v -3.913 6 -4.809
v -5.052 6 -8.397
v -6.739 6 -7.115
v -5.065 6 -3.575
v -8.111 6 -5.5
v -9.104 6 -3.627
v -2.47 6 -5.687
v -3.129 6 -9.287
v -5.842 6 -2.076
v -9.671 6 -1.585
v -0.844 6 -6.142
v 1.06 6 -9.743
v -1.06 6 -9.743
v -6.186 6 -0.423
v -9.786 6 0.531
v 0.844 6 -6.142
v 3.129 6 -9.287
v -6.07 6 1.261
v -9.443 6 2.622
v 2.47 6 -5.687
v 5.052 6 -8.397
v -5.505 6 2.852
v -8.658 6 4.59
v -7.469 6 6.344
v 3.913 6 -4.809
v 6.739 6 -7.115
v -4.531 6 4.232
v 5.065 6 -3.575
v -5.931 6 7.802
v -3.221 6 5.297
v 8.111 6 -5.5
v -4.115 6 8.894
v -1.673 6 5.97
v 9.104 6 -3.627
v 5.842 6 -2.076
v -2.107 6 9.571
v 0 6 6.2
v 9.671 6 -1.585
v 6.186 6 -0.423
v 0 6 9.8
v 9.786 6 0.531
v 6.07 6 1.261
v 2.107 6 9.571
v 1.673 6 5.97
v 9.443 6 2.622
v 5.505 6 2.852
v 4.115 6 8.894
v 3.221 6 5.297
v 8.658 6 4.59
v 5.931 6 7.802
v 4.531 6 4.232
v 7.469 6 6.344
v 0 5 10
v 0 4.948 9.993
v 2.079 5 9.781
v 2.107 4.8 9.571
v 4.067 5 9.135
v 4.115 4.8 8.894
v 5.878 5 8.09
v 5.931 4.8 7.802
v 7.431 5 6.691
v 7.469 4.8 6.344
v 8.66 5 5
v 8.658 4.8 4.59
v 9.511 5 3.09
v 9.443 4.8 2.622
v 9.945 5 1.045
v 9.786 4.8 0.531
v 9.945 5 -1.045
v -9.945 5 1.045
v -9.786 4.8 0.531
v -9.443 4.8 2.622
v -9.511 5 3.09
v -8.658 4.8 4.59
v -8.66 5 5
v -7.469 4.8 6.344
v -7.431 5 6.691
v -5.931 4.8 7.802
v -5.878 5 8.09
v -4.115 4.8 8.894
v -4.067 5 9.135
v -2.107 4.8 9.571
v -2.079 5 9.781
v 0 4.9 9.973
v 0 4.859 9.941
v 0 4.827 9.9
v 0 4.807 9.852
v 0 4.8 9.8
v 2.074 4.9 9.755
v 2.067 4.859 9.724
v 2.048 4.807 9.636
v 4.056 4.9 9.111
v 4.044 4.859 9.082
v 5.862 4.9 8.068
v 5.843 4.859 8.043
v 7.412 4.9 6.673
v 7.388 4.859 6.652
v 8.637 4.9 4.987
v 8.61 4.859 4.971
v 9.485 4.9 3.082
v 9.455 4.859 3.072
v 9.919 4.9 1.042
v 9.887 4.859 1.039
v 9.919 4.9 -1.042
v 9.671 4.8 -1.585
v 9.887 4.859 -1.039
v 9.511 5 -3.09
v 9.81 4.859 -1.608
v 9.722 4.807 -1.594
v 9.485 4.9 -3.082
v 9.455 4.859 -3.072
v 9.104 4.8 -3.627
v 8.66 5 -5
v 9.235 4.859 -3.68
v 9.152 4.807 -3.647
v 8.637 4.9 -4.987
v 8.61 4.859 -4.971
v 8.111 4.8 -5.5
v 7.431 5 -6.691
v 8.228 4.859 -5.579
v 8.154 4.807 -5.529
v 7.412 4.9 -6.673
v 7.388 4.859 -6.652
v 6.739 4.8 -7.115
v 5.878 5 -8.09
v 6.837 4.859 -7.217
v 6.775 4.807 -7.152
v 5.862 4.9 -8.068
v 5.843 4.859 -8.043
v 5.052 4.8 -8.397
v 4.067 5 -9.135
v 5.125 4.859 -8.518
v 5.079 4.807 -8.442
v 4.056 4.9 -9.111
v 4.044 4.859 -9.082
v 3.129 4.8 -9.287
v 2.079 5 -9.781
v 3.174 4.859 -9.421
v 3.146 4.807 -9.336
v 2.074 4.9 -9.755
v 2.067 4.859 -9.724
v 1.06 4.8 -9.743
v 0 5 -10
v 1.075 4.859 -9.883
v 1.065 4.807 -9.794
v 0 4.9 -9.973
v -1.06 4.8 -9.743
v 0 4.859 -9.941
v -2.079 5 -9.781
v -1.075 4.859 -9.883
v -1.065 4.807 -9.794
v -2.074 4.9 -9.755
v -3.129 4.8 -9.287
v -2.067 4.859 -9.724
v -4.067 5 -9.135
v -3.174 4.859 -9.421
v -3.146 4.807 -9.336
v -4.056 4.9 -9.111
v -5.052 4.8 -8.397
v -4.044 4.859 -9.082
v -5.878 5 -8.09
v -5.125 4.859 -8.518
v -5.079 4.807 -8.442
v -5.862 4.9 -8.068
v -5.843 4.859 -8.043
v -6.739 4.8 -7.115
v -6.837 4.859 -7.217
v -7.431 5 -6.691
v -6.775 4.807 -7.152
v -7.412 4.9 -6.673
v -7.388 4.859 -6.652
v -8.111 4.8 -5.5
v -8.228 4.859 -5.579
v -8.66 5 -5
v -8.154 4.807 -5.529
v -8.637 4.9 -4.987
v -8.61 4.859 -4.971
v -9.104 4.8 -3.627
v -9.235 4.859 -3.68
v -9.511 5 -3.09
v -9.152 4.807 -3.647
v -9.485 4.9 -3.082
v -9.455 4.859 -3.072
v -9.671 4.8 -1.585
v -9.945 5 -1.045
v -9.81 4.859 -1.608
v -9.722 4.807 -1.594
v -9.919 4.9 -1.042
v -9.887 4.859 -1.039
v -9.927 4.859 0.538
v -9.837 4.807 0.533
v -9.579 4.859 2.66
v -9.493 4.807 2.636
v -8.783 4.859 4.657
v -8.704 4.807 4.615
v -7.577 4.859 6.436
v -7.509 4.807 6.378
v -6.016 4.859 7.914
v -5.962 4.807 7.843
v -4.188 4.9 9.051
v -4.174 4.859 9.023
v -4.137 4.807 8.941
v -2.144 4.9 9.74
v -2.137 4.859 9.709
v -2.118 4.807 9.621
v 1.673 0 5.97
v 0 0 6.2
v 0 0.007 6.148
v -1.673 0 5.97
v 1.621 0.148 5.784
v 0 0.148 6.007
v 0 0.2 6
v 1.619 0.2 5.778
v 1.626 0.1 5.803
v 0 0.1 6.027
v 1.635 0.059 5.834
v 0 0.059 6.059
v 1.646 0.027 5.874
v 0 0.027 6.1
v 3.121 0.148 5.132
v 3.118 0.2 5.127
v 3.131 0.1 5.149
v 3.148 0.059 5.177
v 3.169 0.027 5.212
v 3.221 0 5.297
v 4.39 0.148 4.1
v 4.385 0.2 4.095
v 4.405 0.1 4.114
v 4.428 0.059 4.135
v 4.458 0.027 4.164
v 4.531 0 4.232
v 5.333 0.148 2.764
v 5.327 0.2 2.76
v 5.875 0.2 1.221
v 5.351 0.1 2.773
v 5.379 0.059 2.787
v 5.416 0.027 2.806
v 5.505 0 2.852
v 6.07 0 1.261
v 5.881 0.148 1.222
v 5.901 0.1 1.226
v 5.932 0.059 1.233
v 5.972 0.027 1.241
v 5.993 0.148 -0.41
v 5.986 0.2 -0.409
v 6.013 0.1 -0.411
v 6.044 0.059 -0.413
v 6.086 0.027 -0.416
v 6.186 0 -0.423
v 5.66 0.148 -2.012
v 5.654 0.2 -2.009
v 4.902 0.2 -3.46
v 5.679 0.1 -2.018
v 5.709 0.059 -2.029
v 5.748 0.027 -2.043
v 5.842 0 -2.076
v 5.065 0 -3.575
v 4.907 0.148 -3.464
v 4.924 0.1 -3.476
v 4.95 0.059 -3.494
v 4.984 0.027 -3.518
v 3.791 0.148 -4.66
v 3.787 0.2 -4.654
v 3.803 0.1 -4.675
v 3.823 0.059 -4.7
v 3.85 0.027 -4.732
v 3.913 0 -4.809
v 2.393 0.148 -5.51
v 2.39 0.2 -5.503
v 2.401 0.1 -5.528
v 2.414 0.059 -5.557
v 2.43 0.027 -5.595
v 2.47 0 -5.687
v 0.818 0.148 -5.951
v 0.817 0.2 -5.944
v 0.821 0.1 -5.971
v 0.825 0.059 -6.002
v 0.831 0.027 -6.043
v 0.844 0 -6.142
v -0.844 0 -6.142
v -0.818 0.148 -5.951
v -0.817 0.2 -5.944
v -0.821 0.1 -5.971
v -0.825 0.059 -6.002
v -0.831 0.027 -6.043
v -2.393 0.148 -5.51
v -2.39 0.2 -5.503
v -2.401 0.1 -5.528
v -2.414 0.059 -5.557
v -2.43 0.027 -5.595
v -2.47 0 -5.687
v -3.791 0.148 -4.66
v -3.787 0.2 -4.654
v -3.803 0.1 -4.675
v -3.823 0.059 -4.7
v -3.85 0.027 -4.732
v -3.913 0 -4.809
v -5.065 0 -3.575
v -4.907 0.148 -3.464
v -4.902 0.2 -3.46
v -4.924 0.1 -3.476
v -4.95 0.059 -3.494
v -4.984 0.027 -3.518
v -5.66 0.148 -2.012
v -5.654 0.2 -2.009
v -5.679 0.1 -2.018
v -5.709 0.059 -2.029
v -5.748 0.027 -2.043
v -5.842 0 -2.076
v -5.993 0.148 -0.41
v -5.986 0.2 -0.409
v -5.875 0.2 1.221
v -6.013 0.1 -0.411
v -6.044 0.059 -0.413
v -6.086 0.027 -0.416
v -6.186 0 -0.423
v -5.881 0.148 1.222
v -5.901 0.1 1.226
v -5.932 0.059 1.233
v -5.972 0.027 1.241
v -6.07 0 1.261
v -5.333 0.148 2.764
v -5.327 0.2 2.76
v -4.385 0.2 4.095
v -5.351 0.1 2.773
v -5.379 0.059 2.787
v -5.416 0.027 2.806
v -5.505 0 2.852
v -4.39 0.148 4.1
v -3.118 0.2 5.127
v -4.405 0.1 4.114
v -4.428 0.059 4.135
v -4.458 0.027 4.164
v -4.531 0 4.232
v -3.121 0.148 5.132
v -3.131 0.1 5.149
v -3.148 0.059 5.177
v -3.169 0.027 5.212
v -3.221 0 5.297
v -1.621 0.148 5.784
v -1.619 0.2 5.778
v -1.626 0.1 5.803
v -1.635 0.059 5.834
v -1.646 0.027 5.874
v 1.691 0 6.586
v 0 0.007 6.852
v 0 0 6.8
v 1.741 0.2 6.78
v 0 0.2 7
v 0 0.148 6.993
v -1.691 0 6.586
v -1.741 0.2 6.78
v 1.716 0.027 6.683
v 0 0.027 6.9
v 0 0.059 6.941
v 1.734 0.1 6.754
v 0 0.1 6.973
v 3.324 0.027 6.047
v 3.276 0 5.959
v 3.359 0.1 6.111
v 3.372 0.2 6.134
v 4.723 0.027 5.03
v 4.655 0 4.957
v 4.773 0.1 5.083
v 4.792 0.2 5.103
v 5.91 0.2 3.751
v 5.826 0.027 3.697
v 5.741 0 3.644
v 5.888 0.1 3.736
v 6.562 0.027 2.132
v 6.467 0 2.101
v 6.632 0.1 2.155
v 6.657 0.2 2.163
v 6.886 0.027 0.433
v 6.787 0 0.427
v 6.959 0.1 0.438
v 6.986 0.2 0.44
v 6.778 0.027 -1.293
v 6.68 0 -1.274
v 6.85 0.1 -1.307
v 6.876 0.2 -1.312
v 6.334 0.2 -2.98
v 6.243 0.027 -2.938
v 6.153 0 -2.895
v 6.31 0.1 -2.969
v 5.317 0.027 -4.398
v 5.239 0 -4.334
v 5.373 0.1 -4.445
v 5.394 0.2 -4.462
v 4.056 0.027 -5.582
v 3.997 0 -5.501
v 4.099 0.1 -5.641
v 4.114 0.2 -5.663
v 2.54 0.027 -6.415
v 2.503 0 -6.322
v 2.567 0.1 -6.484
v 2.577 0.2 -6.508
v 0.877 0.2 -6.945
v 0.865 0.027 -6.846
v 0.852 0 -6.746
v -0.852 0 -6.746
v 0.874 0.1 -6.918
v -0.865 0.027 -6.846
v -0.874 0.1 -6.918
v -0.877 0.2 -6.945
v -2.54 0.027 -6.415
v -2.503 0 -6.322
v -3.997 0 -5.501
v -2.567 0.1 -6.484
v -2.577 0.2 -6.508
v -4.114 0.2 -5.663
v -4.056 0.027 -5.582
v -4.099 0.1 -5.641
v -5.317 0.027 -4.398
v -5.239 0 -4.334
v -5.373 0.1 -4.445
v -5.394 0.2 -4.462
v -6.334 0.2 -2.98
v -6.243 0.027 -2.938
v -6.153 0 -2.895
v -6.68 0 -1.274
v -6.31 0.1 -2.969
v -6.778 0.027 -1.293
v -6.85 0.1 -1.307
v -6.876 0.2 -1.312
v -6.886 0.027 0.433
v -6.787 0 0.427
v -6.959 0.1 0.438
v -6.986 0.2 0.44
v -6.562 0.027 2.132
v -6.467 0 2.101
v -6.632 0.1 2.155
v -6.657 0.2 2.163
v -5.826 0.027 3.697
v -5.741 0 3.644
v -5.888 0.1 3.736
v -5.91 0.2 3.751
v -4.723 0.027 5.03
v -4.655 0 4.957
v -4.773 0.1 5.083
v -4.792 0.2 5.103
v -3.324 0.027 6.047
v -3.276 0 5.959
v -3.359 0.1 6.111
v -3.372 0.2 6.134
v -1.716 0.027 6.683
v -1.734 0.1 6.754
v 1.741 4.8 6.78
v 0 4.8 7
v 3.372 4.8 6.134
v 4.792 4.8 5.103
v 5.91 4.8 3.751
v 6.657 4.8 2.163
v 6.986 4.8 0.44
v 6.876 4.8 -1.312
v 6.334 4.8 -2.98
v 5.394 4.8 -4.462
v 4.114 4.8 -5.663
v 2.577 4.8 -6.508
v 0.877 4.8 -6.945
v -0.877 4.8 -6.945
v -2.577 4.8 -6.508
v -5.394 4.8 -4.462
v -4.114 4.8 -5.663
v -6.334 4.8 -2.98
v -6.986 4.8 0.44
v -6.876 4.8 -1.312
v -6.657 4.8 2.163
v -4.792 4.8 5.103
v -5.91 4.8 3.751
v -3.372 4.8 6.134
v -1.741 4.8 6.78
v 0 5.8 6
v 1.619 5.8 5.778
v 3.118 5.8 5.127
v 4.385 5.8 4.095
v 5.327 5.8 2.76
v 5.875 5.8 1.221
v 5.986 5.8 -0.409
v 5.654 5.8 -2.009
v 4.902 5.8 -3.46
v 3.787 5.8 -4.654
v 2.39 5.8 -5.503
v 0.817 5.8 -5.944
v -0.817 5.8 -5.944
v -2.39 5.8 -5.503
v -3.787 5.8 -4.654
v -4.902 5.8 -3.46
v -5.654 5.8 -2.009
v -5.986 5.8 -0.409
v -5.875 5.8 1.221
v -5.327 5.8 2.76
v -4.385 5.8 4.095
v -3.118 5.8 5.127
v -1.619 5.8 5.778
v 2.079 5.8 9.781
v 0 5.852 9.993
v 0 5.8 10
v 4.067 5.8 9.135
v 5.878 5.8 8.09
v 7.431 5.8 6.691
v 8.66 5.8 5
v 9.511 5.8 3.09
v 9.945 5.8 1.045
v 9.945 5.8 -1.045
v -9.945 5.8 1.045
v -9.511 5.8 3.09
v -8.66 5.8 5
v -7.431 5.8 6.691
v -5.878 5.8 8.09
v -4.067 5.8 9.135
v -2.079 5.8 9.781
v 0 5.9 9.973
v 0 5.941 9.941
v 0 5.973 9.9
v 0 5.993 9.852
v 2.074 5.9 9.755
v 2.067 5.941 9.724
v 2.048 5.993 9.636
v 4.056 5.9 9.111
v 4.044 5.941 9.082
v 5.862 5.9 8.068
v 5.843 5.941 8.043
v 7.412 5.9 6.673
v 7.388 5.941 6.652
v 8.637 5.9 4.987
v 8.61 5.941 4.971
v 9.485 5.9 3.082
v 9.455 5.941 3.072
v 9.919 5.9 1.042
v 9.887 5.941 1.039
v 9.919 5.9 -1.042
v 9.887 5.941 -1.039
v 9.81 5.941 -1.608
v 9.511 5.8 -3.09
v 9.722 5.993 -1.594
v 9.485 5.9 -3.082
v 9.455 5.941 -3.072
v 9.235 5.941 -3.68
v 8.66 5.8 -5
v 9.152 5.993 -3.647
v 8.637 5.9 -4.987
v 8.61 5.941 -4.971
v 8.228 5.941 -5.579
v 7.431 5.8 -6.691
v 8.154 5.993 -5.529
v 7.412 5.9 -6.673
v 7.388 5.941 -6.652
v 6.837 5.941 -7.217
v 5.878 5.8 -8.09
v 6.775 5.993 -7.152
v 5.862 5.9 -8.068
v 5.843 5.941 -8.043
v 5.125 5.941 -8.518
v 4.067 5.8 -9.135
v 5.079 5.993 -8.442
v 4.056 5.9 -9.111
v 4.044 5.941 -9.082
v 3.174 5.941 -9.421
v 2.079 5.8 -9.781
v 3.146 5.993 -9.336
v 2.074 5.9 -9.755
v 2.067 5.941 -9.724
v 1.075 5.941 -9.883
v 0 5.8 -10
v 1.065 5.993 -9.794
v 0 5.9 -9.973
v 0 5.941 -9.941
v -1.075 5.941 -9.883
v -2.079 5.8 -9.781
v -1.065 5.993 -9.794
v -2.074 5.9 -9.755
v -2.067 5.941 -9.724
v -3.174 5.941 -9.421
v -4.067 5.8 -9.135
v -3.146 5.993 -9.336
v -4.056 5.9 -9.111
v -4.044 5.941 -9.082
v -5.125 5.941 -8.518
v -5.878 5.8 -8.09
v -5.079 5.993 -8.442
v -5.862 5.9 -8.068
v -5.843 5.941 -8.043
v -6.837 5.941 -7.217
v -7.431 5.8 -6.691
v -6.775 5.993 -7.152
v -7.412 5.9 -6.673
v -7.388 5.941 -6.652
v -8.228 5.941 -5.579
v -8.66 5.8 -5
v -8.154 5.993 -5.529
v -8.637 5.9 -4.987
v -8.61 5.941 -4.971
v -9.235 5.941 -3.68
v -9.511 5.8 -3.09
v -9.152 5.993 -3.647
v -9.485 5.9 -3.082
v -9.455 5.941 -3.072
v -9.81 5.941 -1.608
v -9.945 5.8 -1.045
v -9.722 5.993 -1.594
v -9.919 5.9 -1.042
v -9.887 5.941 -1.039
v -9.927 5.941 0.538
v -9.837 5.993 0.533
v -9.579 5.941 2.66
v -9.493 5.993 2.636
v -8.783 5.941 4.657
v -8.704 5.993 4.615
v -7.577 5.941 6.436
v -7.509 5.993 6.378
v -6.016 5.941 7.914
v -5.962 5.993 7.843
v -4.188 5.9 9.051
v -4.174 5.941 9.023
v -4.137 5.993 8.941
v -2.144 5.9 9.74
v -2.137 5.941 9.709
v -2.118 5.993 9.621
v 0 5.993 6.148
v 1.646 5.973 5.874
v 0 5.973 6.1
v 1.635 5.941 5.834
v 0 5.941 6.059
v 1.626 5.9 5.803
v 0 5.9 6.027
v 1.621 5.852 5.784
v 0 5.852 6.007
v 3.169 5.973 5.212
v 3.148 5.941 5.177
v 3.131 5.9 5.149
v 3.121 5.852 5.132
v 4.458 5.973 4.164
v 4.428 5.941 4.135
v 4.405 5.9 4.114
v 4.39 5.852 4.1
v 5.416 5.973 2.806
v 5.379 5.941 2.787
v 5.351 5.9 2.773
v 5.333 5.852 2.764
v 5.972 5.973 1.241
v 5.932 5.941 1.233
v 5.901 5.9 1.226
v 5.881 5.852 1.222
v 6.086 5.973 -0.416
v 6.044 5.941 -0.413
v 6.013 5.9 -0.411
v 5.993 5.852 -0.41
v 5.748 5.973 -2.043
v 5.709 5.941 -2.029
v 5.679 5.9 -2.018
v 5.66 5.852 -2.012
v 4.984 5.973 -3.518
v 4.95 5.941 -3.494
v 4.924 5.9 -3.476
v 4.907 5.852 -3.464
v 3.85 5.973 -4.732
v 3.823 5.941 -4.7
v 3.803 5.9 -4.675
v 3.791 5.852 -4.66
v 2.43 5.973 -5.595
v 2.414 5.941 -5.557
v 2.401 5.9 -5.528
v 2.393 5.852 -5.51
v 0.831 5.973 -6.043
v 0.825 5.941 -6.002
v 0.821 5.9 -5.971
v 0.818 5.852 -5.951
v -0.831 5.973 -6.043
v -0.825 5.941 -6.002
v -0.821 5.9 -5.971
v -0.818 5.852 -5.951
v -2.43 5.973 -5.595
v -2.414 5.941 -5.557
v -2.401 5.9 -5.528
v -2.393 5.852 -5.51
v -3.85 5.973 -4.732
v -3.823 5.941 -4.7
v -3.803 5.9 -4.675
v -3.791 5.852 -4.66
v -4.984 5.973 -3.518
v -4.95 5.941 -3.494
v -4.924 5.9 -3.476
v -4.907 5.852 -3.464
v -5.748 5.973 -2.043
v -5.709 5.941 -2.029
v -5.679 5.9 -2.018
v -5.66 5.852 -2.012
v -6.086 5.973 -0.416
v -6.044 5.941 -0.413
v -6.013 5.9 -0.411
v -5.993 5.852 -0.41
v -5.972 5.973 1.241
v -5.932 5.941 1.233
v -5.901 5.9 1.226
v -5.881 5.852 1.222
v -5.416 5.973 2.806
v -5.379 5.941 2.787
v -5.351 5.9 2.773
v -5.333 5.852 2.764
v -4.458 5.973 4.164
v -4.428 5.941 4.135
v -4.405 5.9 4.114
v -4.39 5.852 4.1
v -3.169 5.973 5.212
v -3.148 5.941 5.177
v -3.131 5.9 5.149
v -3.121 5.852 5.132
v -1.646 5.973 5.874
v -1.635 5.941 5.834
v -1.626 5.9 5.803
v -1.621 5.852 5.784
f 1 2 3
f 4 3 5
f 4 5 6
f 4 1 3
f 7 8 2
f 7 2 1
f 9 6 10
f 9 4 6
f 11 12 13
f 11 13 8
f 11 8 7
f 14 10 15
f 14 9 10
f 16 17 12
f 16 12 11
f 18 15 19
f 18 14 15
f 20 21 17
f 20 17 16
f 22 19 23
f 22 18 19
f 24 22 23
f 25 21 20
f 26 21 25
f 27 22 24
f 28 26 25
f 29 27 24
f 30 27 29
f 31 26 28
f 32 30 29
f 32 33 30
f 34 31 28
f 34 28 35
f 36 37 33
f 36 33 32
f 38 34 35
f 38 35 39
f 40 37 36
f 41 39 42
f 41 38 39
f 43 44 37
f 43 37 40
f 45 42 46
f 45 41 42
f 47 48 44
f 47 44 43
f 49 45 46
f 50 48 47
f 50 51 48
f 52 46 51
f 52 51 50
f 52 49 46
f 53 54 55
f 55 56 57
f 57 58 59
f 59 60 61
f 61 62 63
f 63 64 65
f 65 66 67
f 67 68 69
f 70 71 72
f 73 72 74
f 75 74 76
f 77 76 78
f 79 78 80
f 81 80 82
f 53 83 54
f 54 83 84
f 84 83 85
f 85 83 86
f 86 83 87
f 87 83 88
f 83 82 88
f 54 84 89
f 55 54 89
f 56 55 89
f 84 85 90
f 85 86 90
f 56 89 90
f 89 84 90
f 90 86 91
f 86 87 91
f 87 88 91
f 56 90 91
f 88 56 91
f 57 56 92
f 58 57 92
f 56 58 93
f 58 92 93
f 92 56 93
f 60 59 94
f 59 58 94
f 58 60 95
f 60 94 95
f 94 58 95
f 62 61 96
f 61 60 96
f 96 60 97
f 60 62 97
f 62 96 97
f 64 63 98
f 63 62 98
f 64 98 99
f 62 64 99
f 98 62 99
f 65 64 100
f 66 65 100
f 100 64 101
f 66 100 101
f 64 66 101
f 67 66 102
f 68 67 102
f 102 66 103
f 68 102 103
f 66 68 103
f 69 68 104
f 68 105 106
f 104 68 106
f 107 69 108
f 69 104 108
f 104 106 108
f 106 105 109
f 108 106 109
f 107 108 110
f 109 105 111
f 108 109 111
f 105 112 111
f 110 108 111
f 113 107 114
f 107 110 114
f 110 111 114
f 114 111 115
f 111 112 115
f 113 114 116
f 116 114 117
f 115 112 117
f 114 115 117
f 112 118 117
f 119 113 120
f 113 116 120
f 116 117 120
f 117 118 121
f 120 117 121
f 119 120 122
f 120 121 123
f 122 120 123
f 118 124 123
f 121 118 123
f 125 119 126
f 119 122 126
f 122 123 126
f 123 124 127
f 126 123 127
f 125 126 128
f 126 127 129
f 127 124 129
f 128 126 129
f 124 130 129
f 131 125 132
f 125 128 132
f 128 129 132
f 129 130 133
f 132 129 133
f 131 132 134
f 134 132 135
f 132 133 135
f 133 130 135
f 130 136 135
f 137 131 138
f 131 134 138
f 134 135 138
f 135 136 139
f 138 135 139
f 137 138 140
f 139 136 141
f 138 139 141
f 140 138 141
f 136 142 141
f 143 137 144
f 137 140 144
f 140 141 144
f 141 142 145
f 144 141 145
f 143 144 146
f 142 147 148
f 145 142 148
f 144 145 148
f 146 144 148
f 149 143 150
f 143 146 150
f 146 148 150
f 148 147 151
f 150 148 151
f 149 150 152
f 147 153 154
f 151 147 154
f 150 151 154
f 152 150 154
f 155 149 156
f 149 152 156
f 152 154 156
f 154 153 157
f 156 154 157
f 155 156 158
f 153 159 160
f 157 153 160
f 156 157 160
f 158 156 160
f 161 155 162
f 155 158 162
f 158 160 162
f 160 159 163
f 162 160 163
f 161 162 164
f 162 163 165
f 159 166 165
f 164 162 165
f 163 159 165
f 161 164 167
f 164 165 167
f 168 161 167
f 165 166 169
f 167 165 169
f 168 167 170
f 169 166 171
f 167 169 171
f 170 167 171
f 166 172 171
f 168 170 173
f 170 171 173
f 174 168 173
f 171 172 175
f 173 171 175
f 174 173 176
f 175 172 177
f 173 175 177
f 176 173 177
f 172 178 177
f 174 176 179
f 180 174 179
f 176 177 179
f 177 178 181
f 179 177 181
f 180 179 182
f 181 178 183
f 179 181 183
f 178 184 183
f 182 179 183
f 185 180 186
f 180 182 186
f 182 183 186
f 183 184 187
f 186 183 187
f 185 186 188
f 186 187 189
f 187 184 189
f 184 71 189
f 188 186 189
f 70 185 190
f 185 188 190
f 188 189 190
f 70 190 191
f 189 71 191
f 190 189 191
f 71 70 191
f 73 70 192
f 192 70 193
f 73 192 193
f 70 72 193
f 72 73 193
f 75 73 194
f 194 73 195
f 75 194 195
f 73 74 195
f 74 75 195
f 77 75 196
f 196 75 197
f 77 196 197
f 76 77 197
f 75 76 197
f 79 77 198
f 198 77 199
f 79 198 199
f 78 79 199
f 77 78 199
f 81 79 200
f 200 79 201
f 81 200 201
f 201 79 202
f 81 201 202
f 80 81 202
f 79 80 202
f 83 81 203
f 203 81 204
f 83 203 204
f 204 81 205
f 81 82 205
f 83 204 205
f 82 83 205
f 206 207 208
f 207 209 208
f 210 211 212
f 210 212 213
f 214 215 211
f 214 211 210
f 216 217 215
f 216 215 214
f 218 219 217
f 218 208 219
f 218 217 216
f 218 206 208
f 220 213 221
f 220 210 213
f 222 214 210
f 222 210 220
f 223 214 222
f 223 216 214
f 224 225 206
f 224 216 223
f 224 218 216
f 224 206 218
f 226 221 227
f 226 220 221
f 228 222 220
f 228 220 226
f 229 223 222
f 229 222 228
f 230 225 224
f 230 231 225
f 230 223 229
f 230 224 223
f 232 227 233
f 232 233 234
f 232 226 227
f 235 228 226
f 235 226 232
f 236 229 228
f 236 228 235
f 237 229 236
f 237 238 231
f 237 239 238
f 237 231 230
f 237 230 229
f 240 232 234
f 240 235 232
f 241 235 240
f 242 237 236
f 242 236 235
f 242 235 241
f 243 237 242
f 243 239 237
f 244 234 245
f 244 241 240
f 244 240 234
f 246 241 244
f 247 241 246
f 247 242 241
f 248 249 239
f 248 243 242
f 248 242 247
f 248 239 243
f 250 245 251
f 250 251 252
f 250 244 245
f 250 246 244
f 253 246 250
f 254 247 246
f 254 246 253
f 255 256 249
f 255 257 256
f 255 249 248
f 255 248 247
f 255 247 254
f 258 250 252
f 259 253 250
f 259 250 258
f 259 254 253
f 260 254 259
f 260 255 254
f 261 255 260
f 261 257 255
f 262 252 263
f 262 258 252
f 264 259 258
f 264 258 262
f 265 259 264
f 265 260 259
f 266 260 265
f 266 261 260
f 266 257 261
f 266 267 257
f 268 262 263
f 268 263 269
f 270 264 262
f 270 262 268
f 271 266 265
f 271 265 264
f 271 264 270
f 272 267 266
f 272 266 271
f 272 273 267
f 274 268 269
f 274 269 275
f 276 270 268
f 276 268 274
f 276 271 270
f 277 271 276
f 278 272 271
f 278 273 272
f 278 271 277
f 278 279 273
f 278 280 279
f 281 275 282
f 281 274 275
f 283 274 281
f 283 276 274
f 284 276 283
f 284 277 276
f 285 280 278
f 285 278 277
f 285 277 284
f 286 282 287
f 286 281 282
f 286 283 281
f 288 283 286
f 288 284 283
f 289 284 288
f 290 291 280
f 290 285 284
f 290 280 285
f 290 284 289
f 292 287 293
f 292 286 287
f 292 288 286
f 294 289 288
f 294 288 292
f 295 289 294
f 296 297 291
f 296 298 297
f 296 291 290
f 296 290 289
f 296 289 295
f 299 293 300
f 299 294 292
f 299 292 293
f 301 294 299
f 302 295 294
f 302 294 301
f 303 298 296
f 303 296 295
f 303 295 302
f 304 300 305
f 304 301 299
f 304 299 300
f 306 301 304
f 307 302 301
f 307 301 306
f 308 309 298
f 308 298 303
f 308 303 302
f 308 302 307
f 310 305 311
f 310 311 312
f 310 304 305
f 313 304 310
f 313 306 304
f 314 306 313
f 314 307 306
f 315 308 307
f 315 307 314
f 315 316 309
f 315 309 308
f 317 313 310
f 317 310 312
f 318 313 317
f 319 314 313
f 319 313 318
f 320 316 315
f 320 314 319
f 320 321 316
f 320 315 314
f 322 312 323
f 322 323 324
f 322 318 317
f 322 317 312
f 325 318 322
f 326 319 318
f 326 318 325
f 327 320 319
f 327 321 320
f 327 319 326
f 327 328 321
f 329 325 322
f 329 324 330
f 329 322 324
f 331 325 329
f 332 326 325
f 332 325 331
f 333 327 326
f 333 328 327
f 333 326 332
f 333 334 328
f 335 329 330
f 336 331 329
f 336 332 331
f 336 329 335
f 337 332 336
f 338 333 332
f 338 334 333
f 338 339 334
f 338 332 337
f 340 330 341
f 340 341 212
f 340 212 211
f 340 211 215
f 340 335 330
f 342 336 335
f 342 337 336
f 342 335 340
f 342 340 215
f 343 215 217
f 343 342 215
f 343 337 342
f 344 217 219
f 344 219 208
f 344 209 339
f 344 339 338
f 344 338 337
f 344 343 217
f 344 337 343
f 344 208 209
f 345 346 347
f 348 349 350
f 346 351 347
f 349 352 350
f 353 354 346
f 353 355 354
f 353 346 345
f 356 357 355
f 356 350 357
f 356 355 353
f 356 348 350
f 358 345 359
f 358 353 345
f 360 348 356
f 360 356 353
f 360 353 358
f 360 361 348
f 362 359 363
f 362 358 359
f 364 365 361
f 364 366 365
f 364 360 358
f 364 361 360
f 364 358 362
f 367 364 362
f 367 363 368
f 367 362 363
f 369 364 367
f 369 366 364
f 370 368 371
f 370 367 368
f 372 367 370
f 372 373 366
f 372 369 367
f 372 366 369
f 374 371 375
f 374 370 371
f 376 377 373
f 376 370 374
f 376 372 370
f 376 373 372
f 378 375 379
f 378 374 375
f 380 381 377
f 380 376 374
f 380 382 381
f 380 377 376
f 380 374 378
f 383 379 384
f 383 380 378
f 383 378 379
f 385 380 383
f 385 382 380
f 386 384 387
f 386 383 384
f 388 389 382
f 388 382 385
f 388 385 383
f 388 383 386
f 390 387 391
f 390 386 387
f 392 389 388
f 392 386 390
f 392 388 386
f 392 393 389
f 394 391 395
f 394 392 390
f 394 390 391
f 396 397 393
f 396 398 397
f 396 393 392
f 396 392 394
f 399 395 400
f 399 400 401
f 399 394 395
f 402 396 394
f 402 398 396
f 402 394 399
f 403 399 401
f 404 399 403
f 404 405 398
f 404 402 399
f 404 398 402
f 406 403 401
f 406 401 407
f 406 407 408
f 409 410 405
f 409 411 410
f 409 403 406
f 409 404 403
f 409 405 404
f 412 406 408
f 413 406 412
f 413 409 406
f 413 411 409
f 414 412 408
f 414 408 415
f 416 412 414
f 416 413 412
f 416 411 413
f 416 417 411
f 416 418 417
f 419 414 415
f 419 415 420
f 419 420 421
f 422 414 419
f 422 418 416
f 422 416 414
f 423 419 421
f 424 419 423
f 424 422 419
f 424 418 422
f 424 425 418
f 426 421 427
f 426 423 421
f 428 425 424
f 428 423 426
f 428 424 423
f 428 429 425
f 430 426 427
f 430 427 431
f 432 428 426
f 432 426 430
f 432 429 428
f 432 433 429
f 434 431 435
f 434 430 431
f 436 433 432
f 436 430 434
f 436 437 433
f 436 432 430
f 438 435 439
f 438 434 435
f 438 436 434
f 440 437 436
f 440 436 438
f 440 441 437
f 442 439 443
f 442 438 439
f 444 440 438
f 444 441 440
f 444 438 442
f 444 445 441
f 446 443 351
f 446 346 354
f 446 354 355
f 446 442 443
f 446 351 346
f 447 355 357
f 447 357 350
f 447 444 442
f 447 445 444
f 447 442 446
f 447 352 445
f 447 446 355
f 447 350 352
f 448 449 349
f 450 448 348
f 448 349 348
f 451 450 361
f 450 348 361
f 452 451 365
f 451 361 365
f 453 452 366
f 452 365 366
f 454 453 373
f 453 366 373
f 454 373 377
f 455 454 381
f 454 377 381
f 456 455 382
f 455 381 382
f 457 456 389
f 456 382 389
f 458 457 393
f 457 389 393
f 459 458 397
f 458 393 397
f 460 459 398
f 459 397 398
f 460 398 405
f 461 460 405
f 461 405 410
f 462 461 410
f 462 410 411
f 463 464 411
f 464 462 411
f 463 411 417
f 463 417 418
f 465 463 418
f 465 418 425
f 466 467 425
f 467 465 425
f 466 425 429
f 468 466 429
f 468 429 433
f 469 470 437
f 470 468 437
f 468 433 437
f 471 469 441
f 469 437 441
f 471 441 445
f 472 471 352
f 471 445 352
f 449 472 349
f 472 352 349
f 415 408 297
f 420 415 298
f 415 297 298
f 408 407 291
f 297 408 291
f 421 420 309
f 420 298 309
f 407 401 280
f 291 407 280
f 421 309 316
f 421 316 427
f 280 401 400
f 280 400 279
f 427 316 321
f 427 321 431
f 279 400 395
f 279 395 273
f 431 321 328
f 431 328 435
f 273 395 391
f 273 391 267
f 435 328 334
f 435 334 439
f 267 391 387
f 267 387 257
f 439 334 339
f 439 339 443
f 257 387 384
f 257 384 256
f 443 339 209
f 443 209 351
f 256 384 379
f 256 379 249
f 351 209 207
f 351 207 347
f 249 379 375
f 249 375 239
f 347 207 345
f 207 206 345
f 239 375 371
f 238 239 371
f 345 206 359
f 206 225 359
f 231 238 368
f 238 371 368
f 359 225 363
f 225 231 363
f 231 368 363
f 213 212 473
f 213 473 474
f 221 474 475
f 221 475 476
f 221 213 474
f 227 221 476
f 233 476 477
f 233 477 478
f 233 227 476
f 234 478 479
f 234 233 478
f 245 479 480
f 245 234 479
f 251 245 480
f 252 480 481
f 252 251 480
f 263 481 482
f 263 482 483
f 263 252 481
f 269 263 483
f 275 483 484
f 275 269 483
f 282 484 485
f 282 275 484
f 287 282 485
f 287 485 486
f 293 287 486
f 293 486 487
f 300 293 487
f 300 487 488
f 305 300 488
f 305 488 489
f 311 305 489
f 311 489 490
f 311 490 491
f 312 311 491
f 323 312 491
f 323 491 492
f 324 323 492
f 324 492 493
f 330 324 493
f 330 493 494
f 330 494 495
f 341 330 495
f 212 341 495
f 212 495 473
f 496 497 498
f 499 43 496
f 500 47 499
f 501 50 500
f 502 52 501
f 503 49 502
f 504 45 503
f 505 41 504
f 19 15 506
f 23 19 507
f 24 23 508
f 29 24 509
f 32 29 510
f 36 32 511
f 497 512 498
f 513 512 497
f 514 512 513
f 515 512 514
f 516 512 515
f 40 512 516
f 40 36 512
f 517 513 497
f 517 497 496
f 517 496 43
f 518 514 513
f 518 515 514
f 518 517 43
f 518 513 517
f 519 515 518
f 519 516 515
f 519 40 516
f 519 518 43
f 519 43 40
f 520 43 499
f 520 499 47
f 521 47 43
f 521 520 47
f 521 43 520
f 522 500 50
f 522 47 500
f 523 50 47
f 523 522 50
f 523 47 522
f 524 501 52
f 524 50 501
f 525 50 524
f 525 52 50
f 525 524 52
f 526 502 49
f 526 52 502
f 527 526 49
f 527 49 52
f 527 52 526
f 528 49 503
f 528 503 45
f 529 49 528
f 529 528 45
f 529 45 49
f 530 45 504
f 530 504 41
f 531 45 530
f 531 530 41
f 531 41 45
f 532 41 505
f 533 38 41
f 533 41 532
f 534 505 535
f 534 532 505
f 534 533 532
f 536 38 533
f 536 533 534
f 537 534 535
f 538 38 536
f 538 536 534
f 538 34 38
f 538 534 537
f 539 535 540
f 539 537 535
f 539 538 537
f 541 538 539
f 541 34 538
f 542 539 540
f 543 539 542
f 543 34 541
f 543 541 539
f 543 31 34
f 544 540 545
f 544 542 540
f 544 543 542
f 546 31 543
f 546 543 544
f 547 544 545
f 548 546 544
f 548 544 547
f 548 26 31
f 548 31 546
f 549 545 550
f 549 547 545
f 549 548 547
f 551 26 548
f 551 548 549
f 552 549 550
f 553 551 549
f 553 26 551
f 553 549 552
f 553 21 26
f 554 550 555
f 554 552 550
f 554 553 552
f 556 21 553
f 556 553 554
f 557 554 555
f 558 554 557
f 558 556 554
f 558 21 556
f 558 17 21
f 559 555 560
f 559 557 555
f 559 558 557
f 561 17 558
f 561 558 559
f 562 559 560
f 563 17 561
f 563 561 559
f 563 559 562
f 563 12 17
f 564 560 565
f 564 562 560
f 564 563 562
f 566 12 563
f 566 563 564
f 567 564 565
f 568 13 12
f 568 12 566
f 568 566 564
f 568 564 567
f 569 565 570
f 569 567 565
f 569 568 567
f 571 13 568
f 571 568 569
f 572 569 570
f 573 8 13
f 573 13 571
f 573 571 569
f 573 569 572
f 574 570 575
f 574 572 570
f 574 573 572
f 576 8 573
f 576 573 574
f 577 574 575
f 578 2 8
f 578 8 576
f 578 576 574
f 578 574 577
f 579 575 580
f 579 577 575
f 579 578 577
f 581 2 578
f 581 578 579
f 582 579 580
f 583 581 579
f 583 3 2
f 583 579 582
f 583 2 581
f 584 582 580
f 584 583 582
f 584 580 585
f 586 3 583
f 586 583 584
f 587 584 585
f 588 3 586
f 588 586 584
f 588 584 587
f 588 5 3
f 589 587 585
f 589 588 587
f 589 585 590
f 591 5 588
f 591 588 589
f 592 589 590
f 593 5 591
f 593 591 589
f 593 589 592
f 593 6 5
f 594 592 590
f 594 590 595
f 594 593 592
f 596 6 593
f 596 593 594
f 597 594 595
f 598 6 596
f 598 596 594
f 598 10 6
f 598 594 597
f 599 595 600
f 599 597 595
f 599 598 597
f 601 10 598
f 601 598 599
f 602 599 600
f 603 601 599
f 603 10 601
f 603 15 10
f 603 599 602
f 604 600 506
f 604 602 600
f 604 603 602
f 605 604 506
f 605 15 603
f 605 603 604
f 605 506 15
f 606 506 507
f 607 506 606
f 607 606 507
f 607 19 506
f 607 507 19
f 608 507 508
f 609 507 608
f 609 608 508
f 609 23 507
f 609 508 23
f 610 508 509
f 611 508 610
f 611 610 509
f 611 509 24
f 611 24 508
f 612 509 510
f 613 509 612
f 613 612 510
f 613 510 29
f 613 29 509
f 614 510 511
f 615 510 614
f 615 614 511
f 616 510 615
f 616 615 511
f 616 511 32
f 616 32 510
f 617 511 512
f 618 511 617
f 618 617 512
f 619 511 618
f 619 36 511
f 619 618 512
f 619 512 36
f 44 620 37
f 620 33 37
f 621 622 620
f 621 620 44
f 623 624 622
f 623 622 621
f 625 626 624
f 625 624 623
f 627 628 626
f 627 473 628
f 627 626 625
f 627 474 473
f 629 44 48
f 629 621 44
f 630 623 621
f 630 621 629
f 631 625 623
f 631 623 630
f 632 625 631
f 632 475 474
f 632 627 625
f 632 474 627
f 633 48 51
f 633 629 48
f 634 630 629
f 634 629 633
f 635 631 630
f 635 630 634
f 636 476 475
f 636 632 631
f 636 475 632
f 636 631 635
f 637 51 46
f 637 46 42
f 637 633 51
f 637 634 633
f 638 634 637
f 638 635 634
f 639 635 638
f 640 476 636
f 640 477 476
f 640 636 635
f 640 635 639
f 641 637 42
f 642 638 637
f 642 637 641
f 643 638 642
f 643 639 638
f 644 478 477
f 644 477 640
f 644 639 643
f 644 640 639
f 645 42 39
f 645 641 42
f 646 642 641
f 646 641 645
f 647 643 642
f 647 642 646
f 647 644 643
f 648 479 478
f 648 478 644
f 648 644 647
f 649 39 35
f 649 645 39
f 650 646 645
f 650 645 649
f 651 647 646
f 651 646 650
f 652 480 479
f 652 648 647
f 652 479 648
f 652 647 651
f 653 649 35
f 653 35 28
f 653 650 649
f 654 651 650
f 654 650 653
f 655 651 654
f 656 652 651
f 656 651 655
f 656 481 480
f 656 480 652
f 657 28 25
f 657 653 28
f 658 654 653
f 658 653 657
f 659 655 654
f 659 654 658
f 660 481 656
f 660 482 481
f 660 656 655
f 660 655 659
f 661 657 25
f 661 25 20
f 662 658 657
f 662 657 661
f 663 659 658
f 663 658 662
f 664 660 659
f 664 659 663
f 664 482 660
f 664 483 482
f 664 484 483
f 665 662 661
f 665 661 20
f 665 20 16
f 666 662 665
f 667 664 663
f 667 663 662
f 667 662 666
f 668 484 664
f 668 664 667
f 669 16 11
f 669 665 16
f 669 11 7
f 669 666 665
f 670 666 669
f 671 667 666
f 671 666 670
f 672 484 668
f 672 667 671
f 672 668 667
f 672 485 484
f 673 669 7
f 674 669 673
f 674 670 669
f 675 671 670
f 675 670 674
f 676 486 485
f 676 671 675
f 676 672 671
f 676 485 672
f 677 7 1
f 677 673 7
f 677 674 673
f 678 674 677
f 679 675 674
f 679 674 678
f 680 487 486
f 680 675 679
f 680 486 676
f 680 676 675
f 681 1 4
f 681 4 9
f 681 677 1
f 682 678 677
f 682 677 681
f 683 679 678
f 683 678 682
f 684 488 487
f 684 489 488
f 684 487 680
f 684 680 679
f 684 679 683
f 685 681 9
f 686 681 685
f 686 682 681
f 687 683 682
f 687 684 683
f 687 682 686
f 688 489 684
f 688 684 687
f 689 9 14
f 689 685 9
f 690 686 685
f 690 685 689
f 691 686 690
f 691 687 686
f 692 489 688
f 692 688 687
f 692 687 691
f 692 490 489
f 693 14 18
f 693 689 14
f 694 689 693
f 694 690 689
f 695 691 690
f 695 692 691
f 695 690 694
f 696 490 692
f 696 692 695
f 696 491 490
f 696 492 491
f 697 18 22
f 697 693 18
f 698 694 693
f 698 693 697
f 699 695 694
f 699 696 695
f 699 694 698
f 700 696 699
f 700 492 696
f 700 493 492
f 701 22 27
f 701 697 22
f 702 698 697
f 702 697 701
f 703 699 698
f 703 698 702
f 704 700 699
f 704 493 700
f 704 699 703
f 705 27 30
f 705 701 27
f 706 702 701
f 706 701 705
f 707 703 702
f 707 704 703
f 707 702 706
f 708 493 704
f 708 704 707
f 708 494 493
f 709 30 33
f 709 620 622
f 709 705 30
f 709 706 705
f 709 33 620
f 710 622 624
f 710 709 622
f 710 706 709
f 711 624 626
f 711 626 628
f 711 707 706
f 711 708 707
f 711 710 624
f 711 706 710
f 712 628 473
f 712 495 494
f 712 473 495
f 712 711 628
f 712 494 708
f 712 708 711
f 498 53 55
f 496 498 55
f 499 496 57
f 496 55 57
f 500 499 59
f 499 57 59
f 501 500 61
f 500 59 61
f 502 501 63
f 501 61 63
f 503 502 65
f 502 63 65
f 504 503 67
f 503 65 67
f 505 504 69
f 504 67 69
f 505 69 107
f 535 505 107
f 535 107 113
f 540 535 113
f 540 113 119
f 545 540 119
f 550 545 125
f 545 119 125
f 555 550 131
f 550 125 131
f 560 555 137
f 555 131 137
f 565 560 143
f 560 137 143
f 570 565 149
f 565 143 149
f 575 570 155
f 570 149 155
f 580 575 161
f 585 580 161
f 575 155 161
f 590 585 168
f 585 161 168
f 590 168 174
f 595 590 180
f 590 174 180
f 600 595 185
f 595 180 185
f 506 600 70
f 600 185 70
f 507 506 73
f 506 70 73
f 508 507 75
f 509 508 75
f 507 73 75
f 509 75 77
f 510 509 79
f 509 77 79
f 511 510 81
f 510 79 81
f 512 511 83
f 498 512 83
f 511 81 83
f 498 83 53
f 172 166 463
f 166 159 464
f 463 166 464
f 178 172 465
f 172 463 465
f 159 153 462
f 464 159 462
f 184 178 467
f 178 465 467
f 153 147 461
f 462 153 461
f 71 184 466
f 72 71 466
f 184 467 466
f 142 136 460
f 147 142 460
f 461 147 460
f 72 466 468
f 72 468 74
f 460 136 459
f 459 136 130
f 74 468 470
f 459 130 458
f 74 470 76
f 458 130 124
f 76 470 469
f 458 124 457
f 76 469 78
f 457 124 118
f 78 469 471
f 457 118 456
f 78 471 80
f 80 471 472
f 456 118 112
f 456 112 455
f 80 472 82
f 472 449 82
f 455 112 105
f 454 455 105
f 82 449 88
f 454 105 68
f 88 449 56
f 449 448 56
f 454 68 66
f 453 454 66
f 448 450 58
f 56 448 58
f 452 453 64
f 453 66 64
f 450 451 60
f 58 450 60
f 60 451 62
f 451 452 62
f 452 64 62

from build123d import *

# Parameters (mm, degrees)
SKETCH1_R           = 7
SKETCH1_R_2         = 6
BOSS_EXTRUDE1_DEPTH = 6
BOSS_EXTRUDE2_START = -1.2
SKETCH2_R           = 10
SKETCH2_R_2         = 6
BOSS_EXTRUDE2_DEPTH = 1.2
FILLET1_R           = 0.2


with BuildPart() as part:
    # Sketch1 → Boss-Extrude1 (new body)
    with BuildSketch(Plane(origin=(0, 0, 0), x_dir=(1, 0, 0), z_dir=(0, 1, 0))):
        with Locations(Location((0, 0, 0), (0, 0, 270))):
            Circle(SKETCH1_R)
        with Locations(Location((0, 0, 0), (0, 0, 270))):
            Circle(SKETCH1_R_2, mode=Mode.SUBTRACT)
    extrude(amount=BOSS_EXTRUDE1_DEPTH)

    # Sketch2 → Boss-Extrude2 (add)
    with BuildSketch(Plane(origin=(0, 6, 0), x_dir=(1, 0, 0), z_dir=(0, 1, 0)).offset(BOSS_EXTRUDE2_START)):
        with Locations(Location((0, 0, 0), (0, 0, 270))):
            Circle(SKETCH2_R)
        with Locations(Location((0, 0, 0), (0, 0, 270))):
            Circle(SKETCH2_R_2, mode=Mode.SUBTRACT)
    extrude(amount=BOSS_EXTRUDE2_DEPTH)

    # Fillet1
    fillet1_edges = [part.edges().sort_by_distance(p)[0] for p in [
        (0, 6, -10),
        (0, 4.8, -10),
        (0, 0, -7),
        (0, 0, -6),
        (0, 6, -6),
    ]]
    fillet(fillet1_edges, radius=FILLET1_R)


solid = part.part
